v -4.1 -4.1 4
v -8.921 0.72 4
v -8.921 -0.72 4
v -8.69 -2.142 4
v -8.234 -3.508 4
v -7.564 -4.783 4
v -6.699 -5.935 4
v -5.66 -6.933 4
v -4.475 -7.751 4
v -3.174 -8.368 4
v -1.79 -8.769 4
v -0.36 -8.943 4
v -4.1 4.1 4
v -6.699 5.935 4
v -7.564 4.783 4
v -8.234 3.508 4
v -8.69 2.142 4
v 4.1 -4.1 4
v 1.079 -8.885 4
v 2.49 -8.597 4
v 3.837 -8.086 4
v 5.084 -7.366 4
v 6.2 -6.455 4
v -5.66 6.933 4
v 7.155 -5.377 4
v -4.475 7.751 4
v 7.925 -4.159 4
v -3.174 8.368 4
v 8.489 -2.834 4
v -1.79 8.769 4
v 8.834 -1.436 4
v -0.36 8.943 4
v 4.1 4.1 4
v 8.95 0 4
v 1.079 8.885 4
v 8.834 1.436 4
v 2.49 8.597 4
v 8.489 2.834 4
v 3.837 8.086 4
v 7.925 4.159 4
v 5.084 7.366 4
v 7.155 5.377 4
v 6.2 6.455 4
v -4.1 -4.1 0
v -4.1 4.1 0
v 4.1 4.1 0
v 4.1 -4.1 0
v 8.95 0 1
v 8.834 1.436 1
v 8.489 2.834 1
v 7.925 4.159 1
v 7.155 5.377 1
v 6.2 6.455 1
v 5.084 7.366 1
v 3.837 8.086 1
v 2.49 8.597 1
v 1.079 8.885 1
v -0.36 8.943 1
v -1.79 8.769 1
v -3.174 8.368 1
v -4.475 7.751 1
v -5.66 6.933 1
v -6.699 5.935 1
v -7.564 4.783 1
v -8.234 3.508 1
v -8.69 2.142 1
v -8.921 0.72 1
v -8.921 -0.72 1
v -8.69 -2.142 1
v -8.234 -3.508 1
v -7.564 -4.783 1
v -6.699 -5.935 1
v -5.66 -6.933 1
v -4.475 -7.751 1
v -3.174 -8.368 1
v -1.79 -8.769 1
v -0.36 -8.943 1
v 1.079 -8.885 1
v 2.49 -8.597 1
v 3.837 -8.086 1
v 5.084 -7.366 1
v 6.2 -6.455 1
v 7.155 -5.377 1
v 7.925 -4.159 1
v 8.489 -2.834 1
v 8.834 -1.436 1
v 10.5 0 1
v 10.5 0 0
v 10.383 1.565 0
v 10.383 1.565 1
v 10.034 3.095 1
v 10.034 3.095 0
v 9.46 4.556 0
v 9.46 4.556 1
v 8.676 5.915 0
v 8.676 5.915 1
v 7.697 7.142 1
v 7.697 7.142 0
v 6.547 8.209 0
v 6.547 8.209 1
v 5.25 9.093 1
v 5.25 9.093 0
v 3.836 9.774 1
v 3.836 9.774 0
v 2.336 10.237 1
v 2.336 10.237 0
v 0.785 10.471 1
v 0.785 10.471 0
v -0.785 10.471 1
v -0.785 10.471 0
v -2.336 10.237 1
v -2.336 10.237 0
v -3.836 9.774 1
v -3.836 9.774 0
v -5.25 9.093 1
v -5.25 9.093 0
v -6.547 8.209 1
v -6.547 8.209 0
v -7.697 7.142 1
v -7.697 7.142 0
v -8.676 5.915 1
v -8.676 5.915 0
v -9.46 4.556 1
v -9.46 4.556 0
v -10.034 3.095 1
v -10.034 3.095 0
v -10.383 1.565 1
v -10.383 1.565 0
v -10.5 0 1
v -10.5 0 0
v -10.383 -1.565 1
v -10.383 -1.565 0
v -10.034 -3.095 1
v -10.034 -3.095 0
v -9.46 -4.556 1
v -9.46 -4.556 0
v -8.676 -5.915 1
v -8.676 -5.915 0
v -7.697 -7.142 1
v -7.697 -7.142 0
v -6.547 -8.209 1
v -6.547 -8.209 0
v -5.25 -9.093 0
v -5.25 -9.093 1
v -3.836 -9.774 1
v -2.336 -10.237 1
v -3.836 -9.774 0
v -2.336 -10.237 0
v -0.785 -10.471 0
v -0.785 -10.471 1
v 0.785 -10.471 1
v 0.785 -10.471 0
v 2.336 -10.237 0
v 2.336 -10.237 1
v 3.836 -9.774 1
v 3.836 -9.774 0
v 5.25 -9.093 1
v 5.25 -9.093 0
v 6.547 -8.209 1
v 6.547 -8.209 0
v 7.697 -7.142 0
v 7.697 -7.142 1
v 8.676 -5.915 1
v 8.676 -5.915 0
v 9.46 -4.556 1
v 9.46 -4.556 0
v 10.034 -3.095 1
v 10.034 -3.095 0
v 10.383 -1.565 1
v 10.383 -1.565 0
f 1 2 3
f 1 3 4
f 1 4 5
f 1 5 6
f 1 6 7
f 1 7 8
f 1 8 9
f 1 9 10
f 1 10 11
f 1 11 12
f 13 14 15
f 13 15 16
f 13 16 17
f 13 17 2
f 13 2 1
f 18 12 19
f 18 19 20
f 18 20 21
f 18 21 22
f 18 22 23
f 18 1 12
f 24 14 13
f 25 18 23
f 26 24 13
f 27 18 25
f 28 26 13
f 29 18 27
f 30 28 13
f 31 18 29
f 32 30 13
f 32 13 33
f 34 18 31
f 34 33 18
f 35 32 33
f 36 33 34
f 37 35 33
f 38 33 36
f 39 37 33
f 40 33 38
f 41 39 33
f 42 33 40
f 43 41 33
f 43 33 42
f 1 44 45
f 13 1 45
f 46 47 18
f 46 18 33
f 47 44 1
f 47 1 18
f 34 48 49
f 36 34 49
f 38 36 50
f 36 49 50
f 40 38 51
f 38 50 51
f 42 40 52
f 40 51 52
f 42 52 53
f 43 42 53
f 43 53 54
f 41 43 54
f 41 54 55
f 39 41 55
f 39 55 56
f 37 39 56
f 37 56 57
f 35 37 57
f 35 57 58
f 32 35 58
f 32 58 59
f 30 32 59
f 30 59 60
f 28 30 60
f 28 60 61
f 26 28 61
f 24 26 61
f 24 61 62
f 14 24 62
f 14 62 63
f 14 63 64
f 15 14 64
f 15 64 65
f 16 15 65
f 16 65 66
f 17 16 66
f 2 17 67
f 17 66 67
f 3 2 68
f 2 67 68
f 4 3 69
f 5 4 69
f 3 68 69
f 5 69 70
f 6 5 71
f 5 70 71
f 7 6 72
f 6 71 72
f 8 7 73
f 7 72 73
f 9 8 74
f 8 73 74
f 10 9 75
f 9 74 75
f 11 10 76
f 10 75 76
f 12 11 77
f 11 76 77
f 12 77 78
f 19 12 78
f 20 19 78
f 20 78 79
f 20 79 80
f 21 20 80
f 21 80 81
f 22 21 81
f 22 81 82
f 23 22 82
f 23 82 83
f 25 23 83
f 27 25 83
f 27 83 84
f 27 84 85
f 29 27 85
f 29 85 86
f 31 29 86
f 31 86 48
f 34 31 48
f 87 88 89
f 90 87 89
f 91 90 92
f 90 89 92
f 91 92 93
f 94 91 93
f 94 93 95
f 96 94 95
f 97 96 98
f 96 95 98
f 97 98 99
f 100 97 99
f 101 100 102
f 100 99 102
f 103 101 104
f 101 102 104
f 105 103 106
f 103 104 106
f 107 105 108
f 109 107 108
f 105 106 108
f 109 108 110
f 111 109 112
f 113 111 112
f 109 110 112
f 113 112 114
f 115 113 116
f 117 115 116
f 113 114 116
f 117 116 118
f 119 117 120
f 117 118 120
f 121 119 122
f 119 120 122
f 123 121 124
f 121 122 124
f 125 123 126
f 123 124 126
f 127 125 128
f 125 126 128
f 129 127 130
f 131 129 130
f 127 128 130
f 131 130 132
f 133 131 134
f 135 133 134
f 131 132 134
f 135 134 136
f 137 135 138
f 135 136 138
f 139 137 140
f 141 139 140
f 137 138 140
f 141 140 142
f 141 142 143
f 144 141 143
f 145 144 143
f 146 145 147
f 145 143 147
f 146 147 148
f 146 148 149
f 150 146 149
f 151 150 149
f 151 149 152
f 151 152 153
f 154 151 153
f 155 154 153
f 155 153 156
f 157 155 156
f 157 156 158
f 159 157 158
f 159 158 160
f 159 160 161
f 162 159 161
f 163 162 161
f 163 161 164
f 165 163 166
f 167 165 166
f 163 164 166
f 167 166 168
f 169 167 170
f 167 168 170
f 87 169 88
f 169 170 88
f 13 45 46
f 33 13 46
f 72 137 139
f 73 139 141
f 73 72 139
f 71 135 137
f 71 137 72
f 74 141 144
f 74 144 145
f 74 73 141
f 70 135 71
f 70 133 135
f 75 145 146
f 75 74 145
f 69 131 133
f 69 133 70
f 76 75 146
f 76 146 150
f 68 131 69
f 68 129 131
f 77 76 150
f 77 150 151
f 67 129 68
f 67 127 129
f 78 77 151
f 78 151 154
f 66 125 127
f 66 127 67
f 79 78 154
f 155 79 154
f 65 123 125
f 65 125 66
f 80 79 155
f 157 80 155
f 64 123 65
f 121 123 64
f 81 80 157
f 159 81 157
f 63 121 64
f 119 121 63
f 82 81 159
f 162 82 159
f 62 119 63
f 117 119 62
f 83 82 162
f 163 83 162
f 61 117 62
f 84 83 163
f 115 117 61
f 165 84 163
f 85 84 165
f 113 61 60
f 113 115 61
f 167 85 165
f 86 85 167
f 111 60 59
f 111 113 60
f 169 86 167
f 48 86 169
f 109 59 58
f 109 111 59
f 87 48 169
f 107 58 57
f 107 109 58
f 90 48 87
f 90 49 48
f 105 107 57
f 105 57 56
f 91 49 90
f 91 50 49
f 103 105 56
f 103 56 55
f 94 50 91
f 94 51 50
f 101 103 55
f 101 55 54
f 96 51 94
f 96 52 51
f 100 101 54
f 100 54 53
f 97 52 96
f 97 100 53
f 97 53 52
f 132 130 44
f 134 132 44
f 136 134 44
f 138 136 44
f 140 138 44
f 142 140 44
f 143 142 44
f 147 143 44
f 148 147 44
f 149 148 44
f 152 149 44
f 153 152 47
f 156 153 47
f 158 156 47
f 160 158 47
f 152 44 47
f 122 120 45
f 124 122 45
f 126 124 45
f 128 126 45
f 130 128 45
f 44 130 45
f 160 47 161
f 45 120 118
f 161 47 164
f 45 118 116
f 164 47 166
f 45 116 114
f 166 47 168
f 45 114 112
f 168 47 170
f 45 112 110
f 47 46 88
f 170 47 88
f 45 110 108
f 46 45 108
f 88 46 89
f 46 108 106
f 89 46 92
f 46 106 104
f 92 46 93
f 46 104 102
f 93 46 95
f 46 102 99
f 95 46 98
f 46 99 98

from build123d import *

# Parameters (mm, degrees)
SKETCH_R     = 8.95
SKETCH_W     = 8.2
SKETCH_H     = 8.2
PAD_DEPTH    = 4
SKETCH001_R  = 10.5
SKETCH001_W  = 8.2
SKETCH001_H  = 8.2
PAD001_DEPTH = 1


with BuildPart() as part:
    # Sketch → Pad (new body)
    with BuildSketch(Plane.XY):
        Circle(SKETCH_R)
        Rectangle(SKETCH_W, SKETCH_H, mode=Mode.SUBTRACT)
    extrude(amount=PAD_DEPTH)

    # Sketch001 → Pad001 (join)
    with BuildSketch(Plane.XY):
        Circle(SKETCH001_R)
        Rectangle(SKETCH001_W, SKETCH001_H, mode=Mode.SUBTRACT)
    extrude(amount=PAD001_DEPTH)


solid = part.part
